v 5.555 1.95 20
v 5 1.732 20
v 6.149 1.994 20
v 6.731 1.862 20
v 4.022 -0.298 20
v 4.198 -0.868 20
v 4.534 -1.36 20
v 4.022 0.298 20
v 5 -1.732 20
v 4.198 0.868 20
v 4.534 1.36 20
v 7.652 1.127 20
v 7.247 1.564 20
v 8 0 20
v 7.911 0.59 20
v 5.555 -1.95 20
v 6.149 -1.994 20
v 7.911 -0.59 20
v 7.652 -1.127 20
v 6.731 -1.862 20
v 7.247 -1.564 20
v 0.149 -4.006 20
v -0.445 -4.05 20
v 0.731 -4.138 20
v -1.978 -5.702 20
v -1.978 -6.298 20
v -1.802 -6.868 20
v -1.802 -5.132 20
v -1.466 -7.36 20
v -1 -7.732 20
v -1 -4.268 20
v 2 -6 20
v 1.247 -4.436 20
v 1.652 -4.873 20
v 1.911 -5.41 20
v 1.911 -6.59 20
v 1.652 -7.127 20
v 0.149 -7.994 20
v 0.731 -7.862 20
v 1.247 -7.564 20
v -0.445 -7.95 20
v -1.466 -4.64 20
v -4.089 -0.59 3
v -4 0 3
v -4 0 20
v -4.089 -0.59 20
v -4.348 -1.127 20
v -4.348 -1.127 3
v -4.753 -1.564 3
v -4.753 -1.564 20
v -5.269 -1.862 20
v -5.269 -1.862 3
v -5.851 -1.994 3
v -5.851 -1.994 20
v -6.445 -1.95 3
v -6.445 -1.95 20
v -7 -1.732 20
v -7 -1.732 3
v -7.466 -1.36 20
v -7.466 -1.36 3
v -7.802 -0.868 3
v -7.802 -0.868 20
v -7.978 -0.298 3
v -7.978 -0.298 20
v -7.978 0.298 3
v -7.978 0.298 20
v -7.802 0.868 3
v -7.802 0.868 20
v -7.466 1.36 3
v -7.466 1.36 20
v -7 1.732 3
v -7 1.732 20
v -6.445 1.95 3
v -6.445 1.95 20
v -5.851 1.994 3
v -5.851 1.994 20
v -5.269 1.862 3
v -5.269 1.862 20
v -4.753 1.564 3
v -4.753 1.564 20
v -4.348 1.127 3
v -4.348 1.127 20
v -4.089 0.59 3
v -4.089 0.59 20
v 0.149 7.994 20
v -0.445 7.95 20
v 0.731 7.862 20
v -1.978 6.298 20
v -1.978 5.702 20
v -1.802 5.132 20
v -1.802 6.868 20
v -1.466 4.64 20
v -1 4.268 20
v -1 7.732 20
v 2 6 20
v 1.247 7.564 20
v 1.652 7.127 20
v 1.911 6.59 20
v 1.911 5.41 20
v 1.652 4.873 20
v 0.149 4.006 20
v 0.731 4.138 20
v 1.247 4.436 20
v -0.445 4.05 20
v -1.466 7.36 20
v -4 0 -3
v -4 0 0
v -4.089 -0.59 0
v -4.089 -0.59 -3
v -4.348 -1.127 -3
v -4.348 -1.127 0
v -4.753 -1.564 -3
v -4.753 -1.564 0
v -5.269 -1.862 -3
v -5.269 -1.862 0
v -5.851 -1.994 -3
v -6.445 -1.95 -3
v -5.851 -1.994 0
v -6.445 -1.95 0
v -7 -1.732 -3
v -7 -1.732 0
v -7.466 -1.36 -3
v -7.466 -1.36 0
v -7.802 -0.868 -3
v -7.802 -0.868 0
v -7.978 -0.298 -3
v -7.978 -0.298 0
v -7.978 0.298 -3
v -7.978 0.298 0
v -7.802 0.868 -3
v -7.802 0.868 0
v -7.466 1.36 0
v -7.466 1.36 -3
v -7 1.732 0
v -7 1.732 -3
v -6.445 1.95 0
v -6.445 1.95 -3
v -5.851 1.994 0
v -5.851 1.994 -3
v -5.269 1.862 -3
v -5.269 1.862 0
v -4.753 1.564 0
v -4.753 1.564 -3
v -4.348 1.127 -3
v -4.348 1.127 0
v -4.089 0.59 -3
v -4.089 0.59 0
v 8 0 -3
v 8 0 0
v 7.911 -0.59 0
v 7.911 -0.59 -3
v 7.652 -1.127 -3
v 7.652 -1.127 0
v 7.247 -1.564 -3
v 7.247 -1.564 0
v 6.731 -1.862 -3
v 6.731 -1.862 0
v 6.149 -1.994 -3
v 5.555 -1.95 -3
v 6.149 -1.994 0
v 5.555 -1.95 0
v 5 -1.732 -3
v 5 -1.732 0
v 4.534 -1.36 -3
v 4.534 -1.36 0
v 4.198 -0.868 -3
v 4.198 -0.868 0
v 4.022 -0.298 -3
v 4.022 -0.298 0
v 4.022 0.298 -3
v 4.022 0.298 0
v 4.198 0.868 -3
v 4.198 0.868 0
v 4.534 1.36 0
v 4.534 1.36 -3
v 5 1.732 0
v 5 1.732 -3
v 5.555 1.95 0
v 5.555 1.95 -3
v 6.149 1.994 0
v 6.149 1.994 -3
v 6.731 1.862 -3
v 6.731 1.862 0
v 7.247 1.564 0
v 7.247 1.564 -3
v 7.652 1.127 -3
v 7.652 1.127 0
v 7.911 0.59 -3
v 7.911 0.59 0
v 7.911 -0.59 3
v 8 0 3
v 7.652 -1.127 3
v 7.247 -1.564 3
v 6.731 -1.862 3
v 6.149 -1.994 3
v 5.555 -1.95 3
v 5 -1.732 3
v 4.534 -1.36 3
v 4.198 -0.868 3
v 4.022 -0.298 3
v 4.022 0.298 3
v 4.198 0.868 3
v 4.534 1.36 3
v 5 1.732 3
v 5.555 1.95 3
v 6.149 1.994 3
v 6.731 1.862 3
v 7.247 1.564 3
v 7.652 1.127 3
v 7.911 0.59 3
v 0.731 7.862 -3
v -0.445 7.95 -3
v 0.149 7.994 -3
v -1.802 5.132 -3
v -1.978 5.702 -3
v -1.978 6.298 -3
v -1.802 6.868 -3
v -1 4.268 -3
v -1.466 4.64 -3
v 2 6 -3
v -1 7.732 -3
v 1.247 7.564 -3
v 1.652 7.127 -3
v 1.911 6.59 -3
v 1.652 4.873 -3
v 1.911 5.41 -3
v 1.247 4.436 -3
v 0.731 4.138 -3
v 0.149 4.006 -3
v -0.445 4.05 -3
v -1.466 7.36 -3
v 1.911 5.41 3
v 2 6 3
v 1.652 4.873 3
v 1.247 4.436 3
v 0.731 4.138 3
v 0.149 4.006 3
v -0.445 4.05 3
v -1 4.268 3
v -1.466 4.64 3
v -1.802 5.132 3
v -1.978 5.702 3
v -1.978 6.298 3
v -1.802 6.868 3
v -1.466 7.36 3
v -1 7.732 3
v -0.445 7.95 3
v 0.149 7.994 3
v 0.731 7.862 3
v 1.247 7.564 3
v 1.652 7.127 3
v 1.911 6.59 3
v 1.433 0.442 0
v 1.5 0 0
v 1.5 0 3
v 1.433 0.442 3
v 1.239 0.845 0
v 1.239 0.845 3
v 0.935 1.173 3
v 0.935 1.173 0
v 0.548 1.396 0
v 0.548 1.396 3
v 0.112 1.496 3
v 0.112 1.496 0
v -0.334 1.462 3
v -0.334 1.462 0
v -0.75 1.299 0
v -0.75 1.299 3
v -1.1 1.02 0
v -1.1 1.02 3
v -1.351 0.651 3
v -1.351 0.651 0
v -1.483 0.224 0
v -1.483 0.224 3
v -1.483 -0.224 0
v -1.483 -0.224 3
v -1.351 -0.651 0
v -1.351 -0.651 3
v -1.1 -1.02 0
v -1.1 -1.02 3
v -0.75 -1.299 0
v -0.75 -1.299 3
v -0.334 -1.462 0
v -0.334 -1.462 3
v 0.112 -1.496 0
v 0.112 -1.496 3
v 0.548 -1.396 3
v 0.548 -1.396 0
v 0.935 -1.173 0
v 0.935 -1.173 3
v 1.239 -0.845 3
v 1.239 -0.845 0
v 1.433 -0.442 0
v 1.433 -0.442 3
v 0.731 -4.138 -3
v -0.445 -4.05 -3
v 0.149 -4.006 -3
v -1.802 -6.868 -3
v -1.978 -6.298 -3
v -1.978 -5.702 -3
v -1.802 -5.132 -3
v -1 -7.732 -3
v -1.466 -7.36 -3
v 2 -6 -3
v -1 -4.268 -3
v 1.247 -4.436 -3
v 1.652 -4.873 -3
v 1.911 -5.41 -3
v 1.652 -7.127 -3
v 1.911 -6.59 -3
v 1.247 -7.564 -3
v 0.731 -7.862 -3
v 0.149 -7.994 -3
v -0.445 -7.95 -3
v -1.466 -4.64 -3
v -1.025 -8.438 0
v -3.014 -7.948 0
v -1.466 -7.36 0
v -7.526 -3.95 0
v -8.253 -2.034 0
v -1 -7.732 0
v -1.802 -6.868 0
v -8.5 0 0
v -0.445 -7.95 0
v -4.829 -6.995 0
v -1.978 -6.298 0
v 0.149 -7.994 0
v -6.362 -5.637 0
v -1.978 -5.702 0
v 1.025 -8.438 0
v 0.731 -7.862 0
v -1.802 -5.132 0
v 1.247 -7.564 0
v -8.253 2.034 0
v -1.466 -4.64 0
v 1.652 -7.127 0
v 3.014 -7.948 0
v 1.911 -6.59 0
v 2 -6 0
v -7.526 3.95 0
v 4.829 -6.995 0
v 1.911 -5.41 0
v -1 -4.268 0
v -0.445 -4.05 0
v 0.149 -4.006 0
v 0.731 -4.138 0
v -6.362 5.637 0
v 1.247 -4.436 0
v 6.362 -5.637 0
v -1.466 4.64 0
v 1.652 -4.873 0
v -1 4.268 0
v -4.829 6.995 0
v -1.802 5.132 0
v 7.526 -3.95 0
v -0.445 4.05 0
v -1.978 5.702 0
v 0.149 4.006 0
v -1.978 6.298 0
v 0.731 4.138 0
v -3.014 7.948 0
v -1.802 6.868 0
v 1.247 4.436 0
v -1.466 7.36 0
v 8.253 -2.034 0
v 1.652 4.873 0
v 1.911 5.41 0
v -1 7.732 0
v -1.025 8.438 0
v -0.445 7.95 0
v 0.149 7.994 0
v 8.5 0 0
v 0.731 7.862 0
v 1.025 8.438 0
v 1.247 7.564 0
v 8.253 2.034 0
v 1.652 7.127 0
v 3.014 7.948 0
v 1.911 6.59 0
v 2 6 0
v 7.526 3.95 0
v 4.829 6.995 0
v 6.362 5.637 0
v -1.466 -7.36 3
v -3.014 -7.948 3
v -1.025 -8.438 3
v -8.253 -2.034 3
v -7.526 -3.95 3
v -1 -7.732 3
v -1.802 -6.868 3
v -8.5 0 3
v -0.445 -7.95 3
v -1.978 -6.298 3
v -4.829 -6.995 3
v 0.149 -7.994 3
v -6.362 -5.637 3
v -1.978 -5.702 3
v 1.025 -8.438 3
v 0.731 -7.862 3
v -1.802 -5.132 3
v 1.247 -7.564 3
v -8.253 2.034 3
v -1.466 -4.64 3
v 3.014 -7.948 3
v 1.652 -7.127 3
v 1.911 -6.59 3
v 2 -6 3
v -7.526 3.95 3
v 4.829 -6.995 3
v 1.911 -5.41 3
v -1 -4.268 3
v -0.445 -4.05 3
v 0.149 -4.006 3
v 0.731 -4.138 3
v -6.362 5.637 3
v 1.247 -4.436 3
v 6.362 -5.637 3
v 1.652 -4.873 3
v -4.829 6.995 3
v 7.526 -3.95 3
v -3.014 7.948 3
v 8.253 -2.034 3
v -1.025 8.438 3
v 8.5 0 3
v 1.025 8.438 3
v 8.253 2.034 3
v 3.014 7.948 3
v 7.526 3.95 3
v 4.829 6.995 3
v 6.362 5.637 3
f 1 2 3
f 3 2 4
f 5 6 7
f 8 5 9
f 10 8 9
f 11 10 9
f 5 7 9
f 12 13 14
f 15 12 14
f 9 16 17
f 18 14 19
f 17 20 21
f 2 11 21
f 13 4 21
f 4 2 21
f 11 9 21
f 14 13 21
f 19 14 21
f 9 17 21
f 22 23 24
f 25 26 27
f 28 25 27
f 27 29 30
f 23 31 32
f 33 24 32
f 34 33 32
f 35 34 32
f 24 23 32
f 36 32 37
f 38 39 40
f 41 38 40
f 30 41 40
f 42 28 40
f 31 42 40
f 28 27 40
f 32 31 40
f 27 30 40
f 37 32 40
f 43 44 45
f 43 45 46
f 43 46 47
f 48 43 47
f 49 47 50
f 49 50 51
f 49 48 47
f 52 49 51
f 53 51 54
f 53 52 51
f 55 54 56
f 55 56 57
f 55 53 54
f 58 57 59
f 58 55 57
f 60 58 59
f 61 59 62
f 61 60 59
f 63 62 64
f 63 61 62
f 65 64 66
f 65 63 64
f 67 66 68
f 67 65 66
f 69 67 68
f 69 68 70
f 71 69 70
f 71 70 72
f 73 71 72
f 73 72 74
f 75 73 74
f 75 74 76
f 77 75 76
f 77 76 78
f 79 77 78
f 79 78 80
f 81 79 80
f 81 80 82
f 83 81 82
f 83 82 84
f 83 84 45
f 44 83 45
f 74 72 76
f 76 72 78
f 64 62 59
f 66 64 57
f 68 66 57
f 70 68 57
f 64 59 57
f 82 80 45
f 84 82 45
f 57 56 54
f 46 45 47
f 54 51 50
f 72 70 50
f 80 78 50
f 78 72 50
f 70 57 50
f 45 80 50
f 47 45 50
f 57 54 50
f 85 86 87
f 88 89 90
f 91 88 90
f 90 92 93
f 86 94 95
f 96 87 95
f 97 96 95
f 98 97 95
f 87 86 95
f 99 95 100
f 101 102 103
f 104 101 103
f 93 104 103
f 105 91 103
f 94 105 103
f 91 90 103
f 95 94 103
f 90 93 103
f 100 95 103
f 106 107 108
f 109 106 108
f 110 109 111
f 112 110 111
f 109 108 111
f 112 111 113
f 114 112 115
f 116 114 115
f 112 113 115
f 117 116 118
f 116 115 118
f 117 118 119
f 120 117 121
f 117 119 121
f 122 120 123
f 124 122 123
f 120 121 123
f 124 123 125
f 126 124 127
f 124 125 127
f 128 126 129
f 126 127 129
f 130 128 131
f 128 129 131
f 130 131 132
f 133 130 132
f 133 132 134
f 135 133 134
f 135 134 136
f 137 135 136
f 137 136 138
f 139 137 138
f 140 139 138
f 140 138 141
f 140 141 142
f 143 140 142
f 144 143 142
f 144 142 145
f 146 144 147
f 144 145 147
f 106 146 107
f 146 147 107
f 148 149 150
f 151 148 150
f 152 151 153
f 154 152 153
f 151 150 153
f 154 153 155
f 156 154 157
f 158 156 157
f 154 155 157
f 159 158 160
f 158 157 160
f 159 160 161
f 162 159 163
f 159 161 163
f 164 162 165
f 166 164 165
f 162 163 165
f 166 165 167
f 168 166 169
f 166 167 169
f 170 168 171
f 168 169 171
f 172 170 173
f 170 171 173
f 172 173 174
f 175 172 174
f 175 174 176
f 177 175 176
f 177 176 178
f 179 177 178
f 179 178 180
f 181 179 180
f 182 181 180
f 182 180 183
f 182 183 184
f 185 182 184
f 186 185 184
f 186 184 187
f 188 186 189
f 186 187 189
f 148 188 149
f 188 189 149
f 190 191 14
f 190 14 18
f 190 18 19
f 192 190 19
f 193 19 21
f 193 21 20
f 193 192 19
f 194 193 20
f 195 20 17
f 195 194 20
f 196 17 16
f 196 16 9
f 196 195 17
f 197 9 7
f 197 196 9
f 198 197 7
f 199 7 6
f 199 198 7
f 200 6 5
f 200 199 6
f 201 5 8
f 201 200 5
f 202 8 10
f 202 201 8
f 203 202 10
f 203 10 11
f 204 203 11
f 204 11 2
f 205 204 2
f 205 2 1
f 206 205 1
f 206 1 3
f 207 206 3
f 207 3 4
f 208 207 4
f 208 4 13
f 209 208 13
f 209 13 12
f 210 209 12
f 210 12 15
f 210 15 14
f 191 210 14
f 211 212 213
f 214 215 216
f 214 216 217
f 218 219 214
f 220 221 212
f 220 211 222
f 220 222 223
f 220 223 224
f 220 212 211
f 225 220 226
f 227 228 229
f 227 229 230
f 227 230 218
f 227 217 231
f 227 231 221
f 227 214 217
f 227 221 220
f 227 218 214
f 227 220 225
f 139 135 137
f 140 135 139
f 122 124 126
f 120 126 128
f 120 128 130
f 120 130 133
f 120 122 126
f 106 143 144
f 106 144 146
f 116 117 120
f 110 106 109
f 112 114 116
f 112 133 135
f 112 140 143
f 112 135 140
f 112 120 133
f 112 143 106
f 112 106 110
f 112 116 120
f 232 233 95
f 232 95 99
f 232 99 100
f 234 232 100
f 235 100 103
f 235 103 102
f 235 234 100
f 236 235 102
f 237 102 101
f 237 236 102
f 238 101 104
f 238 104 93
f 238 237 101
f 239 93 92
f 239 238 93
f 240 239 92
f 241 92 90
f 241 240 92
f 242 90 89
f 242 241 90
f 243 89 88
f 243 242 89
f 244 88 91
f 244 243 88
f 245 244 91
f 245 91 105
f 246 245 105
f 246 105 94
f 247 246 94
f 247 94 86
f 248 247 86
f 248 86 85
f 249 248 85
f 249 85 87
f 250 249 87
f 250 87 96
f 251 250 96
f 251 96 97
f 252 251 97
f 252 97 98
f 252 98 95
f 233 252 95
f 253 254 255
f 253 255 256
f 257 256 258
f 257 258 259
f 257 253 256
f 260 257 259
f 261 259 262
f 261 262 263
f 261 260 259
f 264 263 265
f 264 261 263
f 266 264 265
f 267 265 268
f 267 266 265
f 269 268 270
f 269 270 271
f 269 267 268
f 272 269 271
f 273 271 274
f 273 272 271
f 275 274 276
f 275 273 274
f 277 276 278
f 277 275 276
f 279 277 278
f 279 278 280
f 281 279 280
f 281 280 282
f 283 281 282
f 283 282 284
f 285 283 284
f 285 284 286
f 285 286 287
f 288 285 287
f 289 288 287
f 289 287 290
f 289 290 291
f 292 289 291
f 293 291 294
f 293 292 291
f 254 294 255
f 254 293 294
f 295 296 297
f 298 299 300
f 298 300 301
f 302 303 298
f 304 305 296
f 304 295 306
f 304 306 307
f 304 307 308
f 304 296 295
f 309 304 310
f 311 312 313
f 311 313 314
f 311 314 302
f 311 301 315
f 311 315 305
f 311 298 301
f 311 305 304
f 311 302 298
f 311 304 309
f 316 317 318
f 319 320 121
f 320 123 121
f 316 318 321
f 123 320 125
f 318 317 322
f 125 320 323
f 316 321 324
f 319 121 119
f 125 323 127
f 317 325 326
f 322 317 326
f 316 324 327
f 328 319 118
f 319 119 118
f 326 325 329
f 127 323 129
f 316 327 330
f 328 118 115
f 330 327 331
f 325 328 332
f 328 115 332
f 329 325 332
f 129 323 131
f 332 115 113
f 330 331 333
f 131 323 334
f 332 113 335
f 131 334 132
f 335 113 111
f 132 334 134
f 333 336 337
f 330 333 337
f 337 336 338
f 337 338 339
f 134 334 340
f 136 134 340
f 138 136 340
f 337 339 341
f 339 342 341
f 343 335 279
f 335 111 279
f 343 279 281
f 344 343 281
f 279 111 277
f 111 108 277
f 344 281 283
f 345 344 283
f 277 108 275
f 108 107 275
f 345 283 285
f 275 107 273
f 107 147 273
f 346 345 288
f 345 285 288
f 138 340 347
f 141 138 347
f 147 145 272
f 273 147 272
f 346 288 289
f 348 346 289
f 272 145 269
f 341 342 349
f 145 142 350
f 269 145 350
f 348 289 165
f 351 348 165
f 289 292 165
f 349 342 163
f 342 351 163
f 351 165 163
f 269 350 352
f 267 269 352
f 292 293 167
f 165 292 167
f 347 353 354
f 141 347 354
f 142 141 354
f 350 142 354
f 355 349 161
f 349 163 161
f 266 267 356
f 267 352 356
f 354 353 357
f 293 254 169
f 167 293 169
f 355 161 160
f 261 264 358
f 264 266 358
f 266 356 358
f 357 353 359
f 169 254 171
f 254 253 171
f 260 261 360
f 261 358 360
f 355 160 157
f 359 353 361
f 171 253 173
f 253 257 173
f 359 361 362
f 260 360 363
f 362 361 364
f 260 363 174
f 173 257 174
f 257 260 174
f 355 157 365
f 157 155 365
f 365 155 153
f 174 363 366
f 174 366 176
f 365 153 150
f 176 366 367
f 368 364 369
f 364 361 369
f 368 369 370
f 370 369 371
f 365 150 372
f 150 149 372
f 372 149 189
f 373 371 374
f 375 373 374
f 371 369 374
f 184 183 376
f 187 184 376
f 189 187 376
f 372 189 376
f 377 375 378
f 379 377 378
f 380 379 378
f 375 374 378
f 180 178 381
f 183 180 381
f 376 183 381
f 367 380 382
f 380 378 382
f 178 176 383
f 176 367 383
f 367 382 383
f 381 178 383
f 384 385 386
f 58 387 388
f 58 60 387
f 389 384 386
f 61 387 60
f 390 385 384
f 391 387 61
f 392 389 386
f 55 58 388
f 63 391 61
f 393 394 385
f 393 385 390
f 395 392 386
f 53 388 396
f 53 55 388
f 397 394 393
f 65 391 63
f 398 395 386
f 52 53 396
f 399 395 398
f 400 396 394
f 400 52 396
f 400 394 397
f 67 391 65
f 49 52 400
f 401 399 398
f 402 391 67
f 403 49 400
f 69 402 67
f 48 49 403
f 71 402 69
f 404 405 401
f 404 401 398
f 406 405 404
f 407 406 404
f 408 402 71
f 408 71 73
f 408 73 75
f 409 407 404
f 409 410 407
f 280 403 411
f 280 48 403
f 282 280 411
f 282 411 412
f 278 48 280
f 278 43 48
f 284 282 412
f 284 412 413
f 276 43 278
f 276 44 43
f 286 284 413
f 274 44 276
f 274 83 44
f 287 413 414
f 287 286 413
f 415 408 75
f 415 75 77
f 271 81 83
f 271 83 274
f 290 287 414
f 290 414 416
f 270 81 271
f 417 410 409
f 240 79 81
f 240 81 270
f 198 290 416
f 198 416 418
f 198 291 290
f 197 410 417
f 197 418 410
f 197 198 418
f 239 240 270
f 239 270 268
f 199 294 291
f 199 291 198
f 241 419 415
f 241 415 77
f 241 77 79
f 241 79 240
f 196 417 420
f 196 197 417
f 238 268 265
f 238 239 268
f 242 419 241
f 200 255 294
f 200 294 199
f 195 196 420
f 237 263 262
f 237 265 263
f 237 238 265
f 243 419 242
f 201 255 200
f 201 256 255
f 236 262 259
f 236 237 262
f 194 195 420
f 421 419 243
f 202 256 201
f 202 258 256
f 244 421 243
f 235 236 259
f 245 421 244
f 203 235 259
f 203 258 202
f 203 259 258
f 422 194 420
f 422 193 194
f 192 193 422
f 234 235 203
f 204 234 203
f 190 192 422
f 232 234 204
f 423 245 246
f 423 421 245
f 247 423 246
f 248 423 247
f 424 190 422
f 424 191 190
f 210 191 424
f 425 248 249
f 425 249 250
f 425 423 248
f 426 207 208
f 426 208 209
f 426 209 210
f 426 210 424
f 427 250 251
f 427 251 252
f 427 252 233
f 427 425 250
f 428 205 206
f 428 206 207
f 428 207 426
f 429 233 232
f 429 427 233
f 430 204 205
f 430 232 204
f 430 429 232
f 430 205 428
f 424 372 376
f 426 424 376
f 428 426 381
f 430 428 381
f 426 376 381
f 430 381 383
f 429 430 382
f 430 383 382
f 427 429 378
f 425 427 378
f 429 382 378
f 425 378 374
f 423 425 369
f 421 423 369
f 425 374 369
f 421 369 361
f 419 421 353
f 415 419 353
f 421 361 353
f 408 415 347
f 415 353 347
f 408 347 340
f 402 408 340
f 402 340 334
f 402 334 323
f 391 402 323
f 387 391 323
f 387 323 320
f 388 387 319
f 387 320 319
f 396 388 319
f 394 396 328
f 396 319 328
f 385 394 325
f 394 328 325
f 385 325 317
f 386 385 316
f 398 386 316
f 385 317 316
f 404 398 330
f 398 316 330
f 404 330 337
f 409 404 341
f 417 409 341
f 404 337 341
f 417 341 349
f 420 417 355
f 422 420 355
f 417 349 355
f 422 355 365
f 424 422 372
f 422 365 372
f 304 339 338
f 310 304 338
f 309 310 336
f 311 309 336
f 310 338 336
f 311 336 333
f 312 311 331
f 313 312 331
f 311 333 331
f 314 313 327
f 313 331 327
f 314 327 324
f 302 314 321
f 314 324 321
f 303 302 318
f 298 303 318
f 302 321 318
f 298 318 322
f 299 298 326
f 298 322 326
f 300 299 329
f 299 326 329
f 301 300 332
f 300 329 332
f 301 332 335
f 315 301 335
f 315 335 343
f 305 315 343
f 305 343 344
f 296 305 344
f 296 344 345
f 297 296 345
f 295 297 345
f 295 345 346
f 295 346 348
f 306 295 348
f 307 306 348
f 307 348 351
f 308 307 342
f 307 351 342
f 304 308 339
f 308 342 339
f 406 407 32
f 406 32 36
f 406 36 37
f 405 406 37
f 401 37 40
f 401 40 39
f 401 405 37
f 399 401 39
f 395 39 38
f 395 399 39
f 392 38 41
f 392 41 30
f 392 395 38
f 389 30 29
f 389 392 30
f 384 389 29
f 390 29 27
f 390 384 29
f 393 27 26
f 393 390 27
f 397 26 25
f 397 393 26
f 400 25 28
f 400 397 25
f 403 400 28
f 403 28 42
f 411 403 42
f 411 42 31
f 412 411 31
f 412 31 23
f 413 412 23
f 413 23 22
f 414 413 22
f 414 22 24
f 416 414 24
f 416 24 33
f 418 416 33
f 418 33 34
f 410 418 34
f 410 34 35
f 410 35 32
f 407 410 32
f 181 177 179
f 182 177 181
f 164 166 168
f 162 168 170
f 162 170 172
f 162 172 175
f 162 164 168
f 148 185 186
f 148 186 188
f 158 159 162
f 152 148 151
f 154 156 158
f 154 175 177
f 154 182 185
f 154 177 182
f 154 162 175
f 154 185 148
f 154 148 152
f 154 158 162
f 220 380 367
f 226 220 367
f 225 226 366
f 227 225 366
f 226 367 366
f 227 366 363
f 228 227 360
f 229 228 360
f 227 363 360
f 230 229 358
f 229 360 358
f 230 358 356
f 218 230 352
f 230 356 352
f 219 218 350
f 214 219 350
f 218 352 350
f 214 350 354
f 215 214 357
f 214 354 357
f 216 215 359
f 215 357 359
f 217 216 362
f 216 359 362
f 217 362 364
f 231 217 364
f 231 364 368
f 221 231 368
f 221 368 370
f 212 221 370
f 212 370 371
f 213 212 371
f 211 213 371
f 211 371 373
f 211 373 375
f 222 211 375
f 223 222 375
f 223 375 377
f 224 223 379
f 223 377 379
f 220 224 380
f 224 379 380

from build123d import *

# Parameters (mm, degrees)
SKETCH_R          = 8.5
SKETCH_R_2        = 1.5
PAD_DEPTH         = 3
SKETCH001_R       = 2
PAD001_DEPTH      = 3
PAD001_DEPTH_BACK = 20


with BuildPart() as part:
    # Sketch → Pad (new body)
    with BuildSketch(Plane.XY):
        Circle(SKETCH_R)
        Circle(SKETCH_R_2, mode=Mode.SUBTRACT)
    extrude(amount=PAD_DEPTH)

    # Sketch001 → Pad001 (new body, two sides)
    with BuildSketch(Plane(origin=(0, 0, 0), x_dir=(1, 0, 0), z_dir=(0, 0, -1))) as pad001_sk:
        with Locations((0, 6)):
            Circle(SKETCH001_R)
        with Locations((6, 0)):
            Circle(SKETCH001_R)
        with Locations((-6, 0)):
            Circle(SKETCH001_R)
        with Locations((0, -6)):
            Circle(SKETCH001_R)
    extrude(amount=PAD001_DEPTH)
    extrude(pad001_sk.sketch, amount=-PAD001_DEPTH_BACK)


solid = part.part
